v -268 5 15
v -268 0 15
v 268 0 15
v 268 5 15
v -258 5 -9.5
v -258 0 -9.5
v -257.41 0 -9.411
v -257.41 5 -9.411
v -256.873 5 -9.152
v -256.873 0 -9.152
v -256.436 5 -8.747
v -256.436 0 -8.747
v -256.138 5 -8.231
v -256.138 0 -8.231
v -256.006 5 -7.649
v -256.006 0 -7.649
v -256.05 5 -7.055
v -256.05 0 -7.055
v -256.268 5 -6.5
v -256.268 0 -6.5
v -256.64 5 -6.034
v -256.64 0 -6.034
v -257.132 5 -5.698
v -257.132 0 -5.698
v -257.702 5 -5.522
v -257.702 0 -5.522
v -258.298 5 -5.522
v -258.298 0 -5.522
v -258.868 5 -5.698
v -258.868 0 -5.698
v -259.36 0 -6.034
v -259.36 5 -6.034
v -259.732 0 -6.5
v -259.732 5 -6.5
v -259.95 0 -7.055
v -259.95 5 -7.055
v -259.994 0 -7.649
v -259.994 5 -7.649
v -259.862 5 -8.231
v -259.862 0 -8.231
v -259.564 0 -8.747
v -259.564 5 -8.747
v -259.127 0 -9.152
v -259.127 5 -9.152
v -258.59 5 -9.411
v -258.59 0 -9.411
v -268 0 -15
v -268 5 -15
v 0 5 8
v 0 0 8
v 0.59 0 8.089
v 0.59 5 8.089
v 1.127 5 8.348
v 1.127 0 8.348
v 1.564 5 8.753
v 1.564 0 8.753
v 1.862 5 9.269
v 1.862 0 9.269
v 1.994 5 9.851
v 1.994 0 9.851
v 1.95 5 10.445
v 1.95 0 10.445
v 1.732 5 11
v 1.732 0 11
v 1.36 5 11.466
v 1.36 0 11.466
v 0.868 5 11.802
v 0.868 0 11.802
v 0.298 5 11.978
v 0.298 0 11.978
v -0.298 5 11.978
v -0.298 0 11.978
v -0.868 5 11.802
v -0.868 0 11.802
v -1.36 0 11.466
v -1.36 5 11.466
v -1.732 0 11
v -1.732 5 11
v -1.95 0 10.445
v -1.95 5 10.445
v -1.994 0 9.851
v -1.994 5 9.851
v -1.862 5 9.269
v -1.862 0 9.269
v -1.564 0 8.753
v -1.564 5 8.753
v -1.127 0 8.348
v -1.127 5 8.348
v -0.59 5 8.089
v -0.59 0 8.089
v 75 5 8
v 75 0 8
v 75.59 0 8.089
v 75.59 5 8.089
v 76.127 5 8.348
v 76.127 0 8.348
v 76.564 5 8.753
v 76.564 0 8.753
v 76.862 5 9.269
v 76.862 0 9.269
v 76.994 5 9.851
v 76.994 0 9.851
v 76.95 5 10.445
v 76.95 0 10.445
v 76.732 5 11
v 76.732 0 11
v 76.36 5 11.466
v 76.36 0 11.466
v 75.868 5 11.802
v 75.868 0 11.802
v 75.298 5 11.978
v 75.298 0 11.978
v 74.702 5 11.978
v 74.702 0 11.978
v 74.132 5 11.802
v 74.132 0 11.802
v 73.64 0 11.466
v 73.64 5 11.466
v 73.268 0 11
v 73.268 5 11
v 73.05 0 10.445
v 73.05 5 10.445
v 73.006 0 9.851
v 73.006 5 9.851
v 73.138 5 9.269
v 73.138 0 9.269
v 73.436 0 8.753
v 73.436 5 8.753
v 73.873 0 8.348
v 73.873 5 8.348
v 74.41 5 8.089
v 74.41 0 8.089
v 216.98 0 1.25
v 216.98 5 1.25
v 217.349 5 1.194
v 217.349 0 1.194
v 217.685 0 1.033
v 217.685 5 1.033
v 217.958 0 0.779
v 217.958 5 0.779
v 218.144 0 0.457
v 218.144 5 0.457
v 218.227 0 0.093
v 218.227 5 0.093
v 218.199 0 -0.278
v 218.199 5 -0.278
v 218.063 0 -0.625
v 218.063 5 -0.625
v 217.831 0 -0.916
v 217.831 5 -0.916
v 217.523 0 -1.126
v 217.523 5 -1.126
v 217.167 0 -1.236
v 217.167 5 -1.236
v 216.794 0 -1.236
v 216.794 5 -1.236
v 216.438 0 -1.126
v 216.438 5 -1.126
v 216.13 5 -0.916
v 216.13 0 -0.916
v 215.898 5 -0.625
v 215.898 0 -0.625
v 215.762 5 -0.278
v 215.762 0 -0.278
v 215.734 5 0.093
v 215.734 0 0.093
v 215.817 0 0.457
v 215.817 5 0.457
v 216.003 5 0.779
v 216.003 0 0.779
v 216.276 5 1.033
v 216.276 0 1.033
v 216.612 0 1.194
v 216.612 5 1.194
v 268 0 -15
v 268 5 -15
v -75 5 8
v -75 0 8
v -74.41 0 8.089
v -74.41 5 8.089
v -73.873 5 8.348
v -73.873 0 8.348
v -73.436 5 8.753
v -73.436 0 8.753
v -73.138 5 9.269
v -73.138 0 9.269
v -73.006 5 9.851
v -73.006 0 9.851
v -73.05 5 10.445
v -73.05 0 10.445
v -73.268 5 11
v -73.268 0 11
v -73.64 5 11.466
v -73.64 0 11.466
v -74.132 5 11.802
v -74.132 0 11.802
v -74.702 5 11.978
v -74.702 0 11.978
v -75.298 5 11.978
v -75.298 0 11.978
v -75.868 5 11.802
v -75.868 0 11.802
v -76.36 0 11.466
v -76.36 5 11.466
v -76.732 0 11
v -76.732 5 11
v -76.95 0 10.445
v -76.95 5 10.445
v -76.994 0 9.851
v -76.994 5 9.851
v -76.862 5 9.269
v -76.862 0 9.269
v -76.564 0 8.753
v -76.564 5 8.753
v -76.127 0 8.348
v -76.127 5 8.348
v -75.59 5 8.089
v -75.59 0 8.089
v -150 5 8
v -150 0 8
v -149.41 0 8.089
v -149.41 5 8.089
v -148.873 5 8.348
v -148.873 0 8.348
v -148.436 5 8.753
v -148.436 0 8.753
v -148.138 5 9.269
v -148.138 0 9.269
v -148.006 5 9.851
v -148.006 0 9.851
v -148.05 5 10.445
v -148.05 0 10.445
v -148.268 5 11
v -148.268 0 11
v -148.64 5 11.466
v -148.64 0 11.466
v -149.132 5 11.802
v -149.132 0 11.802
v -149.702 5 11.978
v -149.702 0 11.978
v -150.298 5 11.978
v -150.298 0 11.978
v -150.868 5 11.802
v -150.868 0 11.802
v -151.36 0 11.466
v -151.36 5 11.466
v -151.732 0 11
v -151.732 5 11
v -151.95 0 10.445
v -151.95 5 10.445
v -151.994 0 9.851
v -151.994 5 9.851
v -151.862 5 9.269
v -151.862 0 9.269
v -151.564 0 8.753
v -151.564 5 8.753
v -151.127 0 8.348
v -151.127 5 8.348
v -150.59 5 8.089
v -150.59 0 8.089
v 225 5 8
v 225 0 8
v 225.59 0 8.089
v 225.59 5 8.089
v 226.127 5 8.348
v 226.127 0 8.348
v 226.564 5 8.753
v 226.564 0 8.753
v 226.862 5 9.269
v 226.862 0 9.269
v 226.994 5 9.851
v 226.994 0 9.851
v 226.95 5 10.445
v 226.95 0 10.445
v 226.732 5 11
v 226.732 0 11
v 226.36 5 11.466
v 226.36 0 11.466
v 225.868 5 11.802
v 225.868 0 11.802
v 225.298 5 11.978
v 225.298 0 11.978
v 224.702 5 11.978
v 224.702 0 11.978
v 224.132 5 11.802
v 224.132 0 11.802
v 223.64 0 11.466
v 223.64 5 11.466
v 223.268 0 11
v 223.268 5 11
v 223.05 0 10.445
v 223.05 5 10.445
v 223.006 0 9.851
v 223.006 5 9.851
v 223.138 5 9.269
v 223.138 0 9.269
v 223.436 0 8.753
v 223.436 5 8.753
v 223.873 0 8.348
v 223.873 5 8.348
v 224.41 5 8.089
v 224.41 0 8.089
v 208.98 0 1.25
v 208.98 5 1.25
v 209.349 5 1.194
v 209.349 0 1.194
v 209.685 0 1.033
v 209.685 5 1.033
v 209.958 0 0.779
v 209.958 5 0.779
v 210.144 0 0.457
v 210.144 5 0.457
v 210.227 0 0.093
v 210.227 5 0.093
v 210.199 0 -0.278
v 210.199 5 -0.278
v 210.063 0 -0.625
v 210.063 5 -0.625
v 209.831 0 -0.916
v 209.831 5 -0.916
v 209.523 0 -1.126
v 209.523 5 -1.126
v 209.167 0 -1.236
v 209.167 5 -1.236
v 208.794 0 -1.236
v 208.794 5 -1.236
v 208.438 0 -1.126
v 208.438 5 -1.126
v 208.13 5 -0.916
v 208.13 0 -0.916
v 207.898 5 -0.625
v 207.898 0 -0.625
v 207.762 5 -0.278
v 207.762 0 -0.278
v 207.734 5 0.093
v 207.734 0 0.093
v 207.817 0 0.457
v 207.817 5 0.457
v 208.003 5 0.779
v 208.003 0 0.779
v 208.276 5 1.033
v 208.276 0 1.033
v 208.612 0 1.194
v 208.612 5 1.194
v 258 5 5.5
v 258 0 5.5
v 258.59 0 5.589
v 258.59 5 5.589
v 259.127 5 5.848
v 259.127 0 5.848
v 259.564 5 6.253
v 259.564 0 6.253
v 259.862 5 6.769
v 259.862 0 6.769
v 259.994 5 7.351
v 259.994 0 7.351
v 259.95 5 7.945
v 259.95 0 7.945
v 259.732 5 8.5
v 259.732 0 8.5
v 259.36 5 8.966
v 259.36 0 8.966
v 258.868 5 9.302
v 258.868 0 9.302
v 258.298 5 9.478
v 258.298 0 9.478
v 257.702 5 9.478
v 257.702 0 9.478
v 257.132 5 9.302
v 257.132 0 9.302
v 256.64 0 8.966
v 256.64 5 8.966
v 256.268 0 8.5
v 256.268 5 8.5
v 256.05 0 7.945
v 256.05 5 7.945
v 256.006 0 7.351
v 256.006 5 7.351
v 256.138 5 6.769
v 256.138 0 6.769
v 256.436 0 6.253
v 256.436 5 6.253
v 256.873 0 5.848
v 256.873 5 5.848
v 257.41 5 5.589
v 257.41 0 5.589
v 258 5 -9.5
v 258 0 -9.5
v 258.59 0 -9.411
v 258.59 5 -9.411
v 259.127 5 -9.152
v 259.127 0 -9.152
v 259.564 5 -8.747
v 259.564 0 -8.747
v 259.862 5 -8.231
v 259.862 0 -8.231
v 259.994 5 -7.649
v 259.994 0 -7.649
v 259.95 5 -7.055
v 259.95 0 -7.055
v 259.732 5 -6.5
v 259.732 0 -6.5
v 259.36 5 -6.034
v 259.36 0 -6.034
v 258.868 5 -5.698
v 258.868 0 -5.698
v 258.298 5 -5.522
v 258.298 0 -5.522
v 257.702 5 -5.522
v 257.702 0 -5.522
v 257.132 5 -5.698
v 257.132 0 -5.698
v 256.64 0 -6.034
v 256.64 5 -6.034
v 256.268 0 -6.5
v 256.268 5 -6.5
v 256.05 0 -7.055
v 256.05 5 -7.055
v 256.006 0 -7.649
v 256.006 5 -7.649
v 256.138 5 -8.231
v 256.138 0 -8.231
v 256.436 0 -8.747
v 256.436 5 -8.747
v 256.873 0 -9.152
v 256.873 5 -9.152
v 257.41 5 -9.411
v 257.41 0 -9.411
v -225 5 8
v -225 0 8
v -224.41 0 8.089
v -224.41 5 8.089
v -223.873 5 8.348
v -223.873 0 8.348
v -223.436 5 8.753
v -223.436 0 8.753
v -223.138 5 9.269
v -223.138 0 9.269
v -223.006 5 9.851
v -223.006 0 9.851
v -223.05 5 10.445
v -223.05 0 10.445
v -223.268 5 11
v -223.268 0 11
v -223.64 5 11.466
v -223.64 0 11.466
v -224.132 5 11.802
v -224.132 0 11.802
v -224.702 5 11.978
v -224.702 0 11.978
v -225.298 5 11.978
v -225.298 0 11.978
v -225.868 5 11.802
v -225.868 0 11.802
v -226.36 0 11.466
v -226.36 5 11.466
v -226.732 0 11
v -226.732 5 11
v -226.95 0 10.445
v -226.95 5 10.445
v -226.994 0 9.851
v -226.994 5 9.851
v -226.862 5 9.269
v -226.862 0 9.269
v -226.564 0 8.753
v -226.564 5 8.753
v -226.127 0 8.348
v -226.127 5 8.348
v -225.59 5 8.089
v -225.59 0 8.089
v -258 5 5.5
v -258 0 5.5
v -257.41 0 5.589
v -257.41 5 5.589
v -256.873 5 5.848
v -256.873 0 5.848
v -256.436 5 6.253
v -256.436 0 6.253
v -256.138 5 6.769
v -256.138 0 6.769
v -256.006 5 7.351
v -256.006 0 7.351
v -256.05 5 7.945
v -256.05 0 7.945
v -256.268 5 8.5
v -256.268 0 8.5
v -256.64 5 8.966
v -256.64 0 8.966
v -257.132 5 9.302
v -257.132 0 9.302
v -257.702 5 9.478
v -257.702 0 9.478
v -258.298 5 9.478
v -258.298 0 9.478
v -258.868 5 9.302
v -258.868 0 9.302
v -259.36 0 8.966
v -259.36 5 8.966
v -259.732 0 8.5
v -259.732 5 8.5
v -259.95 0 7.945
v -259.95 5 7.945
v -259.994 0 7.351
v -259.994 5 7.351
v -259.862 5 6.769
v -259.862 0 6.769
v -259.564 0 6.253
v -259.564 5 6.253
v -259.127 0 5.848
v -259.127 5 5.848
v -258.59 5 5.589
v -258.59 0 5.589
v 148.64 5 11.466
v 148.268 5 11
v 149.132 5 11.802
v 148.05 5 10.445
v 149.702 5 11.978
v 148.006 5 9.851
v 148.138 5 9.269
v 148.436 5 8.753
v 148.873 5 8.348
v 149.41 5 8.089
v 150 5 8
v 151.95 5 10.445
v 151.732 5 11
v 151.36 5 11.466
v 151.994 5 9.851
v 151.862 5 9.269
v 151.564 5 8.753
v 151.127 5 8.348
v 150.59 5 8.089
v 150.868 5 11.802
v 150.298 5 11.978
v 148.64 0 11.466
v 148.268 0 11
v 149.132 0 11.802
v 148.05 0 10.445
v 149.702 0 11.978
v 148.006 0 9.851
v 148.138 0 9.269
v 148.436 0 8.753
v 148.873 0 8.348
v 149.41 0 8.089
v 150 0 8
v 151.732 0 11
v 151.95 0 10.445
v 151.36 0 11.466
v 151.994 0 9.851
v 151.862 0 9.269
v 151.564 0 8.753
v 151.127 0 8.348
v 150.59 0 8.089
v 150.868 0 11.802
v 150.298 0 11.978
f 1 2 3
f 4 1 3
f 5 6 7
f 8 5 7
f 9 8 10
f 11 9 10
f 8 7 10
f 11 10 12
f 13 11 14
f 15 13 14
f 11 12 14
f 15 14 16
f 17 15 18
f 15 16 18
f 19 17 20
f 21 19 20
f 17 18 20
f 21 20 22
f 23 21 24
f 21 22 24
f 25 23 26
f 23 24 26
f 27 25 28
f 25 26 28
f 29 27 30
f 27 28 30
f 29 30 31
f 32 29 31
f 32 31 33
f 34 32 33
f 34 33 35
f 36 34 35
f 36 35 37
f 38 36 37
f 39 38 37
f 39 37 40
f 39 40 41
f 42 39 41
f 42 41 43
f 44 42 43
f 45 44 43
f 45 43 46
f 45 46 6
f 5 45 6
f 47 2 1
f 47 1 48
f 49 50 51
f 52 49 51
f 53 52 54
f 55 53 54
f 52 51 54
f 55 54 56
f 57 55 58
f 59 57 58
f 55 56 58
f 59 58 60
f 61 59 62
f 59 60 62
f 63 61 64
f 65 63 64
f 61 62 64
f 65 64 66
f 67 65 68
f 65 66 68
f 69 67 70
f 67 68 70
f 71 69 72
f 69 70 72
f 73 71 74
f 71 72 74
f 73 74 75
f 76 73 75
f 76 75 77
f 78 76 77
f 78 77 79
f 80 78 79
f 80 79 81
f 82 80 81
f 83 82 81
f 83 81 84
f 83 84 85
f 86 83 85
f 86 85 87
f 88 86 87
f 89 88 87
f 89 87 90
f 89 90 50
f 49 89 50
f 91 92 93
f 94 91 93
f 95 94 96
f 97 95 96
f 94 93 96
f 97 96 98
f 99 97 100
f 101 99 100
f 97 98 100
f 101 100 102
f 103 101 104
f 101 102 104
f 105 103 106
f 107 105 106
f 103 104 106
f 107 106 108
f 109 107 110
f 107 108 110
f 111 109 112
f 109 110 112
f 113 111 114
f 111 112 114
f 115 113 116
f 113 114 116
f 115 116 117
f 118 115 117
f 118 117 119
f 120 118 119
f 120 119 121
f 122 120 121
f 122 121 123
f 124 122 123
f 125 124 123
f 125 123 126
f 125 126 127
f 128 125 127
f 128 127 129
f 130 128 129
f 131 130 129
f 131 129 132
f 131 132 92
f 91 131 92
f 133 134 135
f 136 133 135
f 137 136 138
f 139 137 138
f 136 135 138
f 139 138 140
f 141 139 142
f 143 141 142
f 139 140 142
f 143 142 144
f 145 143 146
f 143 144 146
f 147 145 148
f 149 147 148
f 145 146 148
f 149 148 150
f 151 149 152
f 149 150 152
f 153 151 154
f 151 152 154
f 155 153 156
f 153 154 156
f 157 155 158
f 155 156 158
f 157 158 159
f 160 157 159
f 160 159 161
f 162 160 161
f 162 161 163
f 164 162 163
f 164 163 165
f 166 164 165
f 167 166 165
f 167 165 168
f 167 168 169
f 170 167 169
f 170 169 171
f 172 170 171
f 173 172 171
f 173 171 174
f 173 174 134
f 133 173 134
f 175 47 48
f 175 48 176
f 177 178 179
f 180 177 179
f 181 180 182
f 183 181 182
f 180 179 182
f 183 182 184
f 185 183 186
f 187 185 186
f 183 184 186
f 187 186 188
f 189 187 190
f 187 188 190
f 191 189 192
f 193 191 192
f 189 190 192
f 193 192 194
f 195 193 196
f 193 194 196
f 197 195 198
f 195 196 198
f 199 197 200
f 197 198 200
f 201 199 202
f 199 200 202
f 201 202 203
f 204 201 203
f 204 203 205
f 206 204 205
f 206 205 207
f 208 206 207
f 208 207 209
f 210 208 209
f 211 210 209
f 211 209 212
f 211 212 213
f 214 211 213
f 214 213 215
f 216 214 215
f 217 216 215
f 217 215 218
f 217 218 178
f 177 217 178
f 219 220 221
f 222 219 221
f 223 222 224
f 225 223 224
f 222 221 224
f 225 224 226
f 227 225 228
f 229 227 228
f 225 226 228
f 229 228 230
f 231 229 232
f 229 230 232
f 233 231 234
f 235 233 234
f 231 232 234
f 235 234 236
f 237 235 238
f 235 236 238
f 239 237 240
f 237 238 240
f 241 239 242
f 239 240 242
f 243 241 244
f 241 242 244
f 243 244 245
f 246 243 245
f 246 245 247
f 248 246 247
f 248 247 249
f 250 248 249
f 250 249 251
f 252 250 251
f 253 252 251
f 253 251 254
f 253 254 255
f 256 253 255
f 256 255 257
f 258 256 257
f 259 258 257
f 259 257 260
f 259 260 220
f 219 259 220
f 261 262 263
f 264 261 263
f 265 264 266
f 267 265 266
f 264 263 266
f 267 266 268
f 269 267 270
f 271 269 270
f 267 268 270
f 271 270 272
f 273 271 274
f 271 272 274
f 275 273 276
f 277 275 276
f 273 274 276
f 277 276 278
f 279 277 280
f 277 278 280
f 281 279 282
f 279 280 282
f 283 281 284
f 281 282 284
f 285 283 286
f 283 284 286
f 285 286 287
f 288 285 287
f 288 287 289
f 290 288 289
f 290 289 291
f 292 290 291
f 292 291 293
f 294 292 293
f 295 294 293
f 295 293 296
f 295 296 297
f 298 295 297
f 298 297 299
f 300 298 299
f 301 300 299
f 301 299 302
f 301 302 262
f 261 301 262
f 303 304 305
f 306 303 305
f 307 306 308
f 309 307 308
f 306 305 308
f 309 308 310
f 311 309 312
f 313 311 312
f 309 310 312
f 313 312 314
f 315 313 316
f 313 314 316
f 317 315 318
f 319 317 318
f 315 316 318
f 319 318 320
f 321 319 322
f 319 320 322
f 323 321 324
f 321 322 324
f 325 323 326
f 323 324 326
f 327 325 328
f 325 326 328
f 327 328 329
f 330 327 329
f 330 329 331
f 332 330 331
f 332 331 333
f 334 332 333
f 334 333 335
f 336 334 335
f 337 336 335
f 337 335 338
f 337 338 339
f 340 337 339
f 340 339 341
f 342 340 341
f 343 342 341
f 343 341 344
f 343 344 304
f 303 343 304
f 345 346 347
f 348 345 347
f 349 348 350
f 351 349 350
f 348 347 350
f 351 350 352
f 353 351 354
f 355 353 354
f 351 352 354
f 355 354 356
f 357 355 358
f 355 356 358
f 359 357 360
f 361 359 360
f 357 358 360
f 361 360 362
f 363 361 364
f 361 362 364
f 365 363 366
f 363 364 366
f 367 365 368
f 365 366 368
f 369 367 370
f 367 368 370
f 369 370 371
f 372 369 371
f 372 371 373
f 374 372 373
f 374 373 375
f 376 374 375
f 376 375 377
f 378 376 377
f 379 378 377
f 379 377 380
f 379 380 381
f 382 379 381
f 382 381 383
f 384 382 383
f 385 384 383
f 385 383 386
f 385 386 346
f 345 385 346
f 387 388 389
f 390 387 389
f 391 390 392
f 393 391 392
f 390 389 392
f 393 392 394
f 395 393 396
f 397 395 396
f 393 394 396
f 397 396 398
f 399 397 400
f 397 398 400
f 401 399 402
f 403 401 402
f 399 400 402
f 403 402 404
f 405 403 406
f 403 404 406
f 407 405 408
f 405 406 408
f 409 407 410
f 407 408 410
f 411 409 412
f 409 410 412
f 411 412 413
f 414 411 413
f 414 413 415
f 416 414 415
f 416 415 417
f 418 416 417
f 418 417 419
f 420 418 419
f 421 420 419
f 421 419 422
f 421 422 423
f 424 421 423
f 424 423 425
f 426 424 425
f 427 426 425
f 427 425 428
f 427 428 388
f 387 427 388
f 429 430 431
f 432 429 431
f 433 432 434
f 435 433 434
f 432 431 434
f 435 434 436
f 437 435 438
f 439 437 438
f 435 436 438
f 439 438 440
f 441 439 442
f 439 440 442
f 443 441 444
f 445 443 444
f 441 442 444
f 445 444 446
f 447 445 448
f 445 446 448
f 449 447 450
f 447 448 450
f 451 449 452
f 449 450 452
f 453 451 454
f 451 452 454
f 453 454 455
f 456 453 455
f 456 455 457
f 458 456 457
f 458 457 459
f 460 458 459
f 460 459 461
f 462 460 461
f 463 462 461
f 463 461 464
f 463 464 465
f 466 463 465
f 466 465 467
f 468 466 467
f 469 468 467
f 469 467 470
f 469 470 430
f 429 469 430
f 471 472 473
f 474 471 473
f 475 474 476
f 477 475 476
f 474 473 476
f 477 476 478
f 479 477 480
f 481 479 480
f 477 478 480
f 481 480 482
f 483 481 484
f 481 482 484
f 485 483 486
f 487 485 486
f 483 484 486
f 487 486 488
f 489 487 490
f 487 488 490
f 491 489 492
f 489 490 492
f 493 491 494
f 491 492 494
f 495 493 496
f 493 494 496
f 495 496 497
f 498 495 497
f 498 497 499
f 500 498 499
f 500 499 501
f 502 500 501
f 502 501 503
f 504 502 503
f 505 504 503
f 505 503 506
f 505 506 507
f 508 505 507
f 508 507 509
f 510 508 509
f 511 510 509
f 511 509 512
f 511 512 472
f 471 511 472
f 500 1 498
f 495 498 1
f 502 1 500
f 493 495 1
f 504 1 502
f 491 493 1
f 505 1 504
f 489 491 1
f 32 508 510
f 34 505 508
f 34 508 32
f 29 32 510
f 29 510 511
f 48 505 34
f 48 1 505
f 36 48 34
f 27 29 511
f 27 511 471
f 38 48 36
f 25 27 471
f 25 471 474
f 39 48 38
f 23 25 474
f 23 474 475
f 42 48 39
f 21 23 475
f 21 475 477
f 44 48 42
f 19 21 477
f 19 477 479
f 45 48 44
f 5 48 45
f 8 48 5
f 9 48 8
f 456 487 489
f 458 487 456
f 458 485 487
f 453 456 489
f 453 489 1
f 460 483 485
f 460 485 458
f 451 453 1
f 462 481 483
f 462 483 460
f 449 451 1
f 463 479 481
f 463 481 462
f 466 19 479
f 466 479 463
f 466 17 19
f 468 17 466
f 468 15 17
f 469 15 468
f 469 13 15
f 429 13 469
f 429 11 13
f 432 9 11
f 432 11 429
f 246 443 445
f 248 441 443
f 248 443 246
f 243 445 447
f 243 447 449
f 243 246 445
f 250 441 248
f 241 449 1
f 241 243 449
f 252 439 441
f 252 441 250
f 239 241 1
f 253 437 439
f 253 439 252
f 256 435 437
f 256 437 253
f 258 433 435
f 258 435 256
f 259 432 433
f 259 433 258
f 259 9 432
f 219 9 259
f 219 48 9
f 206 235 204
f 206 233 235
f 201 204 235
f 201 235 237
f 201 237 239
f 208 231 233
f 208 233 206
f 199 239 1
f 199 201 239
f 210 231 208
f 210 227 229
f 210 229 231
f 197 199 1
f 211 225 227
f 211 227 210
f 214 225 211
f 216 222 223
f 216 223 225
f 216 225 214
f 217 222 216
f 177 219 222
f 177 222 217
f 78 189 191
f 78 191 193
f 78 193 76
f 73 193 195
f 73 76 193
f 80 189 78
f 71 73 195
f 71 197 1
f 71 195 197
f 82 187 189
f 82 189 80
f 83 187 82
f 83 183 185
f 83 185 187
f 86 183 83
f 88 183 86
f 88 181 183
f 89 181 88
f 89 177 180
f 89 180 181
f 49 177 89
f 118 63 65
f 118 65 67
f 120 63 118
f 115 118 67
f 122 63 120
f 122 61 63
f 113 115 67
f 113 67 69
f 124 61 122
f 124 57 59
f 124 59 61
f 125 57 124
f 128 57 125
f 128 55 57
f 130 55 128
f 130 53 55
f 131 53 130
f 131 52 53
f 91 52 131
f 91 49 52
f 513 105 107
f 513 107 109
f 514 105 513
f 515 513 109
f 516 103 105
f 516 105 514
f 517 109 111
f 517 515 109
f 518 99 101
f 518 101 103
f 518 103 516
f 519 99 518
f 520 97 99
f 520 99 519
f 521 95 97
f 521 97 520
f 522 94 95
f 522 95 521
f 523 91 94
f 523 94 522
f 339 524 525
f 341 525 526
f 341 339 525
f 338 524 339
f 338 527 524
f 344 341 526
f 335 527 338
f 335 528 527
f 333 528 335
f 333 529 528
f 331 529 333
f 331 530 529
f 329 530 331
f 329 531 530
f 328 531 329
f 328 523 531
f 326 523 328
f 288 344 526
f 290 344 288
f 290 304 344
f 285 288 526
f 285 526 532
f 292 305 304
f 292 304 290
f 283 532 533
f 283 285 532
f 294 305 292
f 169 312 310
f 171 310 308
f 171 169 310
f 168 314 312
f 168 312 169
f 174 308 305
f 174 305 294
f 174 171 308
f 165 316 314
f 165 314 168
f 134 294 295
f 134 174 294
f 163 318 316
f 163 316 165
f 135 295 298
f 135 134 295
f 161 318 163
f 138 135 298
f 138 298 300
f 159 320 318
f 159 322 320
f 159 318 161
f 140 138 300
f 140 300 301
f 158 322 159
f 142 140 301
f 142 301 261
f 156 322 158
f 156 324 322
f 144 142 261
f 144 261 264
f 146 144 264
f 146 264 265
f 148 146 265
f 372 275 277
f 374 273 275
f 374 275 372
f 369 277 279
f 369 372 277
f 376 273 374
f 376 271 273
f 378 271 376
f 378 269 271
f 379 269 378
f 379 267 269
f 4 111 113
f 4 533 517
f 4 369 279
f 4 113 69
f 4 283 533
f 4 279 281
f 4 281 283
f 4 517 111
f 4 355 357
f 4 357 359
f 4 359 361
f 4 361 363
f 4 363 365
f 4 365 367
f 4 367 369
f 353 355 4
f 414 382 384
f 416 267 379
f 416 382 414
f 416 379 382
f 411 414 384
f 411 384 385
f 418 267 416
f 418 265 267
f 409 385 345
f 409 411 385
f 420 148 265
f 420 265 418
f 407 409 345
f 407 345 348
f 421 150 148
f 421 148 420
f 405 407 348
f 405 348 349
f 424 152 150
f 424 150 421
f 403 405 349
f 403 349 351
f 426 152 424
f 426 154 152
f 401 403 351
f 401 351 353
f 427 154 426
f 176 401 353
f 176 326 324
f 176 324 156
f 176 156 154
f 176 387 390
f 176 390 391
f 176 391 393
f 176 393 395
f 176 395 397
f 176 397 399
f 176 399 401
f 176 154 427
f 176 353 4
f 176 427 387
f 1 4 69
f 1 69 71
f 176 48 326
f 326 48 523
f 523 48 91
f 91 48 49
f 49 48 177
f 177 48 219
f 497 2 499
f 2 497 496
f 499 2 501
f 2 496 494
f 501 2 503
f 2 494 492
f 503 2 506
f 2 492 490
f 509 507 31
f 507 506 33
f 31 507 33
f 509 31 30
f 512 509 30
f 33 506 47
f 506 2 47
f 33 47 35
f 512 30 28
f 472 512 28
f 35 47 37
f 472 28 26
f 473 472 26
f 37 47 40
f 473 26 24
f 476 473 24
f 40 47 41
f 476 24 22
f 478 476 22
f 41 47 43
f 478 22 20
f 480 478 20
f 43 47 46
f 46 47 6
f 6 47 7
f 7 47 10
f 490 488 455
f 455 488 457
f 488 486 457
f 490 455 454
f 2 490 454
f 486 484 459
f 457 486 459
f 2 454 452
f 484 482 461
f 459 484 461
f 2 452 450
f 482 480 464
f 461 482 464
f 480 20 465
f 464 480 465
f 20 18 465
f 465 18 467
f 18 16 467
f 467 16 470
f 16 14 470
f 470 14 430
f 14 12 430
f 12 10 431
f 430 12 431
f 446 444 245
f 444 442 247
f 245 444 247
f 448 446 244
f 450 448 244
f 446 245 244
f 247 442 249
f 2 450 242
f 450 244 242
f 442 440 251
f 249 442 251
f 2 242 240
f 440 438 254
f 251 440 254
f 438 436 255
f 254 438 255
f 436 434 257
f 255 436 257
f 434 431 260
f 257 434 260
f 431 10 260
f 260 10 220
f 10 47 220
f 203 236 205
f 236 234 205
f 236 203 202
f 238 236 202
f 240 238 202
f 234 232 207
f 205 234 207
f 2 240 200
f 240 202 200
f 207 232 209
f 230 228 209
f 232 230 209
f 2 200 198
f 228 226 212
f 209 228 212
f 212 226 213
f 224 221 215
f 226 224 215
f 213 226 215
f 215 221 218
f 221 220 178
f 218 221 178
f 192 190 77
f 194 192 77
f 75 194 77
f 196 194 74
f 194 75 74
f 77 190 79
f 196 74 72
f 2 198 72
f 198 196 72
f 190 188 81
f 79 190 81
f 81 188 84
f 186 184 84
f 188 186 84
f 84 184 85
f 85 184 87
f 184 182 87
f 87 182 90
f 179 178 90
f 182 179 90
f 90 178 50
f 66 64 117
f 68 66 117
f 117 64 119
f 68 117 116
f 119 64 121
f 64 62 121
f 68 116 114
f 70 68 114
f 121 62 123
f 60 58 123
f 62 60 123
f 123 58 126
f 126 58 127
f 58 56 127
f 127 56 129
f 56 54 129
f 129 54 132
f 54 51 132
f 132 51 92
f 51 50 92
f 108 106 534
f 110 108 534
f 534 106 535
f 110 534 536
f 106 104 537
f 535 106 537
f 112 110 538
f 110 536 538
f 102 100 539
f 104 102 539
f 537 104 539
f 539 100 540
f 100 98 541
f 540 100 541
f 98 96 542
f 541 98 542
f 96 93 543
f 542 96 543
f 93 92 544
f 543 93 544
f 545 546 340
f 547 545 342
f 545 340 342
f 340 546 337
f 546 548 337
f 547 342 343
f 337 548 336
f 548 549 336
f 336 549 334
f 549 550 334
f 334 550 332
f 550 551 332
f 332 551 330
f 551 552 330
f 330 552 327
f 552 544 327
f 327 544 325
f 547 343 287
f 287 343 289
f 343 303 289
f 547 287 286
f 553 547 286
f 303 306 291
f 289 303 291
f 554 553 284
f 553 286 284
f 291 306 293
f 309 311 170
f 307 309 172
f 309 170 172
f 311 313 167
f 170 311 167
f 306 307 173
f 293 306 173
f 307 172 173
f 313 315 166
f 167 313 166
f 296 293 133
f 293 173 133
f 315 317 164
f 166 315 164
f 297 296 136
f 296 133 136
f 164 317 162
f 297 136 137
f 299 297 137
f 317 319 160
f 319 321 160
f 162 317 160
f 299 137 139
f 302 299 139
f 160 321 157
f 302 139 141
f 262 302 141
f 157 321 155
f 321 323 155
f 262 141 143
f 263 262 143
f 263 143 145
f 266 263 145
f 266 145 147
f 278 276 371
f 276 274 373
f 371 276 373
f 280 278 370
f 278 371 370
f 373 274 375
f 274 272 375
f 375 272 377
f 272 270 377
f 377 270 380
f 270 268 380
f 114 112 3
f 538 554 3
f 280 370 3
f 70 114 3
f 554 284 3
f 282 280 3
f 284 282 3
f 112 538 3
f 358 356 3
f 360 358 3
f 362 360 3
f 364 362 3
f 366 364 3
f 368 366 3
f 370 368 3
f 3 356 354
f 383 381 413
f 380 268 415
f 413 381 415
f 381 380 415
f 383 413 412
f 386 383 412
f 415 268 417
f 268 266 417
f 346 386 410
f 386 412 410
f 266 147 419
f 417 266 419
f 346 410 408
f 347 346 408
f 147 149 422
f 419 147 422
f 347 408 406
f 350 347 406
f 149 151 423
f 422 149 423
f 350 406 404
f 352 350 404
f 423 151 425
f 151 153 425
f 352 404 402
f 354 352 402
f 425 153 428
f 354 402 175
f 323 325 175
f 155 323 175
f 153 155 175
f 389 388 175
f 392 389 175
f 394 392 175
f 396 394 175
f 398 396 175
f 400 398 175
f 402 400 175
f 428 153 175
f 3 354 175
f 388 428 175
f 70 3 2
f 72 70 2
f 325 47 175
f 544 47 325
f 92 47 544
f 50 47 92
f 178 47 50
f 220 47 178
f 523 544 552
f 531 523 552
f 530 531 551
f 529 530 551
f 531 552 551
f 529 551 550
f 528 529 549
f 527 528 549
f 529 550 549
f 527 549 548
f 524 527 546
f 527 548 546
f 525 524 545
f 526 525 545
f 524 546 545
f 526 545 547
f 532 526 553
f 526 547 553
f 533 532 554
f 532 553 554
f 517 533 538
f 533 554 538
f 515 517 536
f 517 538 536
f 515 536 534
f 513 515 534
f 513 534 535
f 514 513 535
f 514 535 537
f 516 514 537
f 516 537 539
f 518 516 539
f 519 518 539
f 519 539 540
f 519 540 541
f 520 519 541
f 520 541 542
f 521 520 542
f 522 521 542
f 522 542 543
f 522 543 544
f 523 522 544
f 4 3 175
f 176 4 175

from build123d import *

# Parameters (mm, degrees)
SKETCH1_W                = 536
SKETCH1_H                = 30
BOSS_EXTRUDE1_DEPTH      = 5
F_4_0_4_DIAMETER_HOLE1_D = 4
M3_TAPPED_HOLE1_D        = 2.5
M3_TAPPED_HOLE1_DEPTH    = 7.5
M3_TAPPED_HOLE1_TIP      = 0.751075774


with BuildPart() as part:
    # Sketch1 → Boss-Extrude1 (new body)
    with BuildSketch(Plane(origin=(0, 0, 0), x_dir=(1, 0, 0), z_dir=(0, 1, 0))):
        Rectangle(SKETCH1_W, SKETCH1_H)
    extrude(amount=BOSS_EXTRUDE1_DEPTH)

    # Ø4.0 (4) Diameter Hole1 (through all)
    with Locations(Plane(origin=(-258, 5, -7.5), x_dir=(0, 0, 1), z_dir=(0, 1, 0))):
        with Locations((0, 0), (15, 0), (17.5, 33), (17.5, 108), (17.5, 183), (17.5, 258), (17.5, 333), (17.5, 408), (17.5, 483), (15, 516), (0, 516)):
            Hole(F_4_0_4_DIAMETER_HOLE1_D / 2)

    # M3 Tapped Hole1
    with Locations(Plane(origin=(216.980485857, 0, 0), x_dir=(0, 0, -1), z_dir=(0, -1, 0))):
        with Locations((0, 0), (0, -8)):
            Hole(M3_TAPPED_HOLE1_D / 2, depth=M3_TAPPED_HOLE1_DEPTH)
            with Locations((0, 0, -(M3_TAPPED_HOLE1_DEPTH + M3_TAPPED_HOLE1_TIP / 2))):  # 118° drill point
                Cone(0, M3_TAPPED_HOLE1_D / 2, M3_TAPPED_HOLE1_TIP, mode=Mode.SUBTRACT)


solid = part.part
